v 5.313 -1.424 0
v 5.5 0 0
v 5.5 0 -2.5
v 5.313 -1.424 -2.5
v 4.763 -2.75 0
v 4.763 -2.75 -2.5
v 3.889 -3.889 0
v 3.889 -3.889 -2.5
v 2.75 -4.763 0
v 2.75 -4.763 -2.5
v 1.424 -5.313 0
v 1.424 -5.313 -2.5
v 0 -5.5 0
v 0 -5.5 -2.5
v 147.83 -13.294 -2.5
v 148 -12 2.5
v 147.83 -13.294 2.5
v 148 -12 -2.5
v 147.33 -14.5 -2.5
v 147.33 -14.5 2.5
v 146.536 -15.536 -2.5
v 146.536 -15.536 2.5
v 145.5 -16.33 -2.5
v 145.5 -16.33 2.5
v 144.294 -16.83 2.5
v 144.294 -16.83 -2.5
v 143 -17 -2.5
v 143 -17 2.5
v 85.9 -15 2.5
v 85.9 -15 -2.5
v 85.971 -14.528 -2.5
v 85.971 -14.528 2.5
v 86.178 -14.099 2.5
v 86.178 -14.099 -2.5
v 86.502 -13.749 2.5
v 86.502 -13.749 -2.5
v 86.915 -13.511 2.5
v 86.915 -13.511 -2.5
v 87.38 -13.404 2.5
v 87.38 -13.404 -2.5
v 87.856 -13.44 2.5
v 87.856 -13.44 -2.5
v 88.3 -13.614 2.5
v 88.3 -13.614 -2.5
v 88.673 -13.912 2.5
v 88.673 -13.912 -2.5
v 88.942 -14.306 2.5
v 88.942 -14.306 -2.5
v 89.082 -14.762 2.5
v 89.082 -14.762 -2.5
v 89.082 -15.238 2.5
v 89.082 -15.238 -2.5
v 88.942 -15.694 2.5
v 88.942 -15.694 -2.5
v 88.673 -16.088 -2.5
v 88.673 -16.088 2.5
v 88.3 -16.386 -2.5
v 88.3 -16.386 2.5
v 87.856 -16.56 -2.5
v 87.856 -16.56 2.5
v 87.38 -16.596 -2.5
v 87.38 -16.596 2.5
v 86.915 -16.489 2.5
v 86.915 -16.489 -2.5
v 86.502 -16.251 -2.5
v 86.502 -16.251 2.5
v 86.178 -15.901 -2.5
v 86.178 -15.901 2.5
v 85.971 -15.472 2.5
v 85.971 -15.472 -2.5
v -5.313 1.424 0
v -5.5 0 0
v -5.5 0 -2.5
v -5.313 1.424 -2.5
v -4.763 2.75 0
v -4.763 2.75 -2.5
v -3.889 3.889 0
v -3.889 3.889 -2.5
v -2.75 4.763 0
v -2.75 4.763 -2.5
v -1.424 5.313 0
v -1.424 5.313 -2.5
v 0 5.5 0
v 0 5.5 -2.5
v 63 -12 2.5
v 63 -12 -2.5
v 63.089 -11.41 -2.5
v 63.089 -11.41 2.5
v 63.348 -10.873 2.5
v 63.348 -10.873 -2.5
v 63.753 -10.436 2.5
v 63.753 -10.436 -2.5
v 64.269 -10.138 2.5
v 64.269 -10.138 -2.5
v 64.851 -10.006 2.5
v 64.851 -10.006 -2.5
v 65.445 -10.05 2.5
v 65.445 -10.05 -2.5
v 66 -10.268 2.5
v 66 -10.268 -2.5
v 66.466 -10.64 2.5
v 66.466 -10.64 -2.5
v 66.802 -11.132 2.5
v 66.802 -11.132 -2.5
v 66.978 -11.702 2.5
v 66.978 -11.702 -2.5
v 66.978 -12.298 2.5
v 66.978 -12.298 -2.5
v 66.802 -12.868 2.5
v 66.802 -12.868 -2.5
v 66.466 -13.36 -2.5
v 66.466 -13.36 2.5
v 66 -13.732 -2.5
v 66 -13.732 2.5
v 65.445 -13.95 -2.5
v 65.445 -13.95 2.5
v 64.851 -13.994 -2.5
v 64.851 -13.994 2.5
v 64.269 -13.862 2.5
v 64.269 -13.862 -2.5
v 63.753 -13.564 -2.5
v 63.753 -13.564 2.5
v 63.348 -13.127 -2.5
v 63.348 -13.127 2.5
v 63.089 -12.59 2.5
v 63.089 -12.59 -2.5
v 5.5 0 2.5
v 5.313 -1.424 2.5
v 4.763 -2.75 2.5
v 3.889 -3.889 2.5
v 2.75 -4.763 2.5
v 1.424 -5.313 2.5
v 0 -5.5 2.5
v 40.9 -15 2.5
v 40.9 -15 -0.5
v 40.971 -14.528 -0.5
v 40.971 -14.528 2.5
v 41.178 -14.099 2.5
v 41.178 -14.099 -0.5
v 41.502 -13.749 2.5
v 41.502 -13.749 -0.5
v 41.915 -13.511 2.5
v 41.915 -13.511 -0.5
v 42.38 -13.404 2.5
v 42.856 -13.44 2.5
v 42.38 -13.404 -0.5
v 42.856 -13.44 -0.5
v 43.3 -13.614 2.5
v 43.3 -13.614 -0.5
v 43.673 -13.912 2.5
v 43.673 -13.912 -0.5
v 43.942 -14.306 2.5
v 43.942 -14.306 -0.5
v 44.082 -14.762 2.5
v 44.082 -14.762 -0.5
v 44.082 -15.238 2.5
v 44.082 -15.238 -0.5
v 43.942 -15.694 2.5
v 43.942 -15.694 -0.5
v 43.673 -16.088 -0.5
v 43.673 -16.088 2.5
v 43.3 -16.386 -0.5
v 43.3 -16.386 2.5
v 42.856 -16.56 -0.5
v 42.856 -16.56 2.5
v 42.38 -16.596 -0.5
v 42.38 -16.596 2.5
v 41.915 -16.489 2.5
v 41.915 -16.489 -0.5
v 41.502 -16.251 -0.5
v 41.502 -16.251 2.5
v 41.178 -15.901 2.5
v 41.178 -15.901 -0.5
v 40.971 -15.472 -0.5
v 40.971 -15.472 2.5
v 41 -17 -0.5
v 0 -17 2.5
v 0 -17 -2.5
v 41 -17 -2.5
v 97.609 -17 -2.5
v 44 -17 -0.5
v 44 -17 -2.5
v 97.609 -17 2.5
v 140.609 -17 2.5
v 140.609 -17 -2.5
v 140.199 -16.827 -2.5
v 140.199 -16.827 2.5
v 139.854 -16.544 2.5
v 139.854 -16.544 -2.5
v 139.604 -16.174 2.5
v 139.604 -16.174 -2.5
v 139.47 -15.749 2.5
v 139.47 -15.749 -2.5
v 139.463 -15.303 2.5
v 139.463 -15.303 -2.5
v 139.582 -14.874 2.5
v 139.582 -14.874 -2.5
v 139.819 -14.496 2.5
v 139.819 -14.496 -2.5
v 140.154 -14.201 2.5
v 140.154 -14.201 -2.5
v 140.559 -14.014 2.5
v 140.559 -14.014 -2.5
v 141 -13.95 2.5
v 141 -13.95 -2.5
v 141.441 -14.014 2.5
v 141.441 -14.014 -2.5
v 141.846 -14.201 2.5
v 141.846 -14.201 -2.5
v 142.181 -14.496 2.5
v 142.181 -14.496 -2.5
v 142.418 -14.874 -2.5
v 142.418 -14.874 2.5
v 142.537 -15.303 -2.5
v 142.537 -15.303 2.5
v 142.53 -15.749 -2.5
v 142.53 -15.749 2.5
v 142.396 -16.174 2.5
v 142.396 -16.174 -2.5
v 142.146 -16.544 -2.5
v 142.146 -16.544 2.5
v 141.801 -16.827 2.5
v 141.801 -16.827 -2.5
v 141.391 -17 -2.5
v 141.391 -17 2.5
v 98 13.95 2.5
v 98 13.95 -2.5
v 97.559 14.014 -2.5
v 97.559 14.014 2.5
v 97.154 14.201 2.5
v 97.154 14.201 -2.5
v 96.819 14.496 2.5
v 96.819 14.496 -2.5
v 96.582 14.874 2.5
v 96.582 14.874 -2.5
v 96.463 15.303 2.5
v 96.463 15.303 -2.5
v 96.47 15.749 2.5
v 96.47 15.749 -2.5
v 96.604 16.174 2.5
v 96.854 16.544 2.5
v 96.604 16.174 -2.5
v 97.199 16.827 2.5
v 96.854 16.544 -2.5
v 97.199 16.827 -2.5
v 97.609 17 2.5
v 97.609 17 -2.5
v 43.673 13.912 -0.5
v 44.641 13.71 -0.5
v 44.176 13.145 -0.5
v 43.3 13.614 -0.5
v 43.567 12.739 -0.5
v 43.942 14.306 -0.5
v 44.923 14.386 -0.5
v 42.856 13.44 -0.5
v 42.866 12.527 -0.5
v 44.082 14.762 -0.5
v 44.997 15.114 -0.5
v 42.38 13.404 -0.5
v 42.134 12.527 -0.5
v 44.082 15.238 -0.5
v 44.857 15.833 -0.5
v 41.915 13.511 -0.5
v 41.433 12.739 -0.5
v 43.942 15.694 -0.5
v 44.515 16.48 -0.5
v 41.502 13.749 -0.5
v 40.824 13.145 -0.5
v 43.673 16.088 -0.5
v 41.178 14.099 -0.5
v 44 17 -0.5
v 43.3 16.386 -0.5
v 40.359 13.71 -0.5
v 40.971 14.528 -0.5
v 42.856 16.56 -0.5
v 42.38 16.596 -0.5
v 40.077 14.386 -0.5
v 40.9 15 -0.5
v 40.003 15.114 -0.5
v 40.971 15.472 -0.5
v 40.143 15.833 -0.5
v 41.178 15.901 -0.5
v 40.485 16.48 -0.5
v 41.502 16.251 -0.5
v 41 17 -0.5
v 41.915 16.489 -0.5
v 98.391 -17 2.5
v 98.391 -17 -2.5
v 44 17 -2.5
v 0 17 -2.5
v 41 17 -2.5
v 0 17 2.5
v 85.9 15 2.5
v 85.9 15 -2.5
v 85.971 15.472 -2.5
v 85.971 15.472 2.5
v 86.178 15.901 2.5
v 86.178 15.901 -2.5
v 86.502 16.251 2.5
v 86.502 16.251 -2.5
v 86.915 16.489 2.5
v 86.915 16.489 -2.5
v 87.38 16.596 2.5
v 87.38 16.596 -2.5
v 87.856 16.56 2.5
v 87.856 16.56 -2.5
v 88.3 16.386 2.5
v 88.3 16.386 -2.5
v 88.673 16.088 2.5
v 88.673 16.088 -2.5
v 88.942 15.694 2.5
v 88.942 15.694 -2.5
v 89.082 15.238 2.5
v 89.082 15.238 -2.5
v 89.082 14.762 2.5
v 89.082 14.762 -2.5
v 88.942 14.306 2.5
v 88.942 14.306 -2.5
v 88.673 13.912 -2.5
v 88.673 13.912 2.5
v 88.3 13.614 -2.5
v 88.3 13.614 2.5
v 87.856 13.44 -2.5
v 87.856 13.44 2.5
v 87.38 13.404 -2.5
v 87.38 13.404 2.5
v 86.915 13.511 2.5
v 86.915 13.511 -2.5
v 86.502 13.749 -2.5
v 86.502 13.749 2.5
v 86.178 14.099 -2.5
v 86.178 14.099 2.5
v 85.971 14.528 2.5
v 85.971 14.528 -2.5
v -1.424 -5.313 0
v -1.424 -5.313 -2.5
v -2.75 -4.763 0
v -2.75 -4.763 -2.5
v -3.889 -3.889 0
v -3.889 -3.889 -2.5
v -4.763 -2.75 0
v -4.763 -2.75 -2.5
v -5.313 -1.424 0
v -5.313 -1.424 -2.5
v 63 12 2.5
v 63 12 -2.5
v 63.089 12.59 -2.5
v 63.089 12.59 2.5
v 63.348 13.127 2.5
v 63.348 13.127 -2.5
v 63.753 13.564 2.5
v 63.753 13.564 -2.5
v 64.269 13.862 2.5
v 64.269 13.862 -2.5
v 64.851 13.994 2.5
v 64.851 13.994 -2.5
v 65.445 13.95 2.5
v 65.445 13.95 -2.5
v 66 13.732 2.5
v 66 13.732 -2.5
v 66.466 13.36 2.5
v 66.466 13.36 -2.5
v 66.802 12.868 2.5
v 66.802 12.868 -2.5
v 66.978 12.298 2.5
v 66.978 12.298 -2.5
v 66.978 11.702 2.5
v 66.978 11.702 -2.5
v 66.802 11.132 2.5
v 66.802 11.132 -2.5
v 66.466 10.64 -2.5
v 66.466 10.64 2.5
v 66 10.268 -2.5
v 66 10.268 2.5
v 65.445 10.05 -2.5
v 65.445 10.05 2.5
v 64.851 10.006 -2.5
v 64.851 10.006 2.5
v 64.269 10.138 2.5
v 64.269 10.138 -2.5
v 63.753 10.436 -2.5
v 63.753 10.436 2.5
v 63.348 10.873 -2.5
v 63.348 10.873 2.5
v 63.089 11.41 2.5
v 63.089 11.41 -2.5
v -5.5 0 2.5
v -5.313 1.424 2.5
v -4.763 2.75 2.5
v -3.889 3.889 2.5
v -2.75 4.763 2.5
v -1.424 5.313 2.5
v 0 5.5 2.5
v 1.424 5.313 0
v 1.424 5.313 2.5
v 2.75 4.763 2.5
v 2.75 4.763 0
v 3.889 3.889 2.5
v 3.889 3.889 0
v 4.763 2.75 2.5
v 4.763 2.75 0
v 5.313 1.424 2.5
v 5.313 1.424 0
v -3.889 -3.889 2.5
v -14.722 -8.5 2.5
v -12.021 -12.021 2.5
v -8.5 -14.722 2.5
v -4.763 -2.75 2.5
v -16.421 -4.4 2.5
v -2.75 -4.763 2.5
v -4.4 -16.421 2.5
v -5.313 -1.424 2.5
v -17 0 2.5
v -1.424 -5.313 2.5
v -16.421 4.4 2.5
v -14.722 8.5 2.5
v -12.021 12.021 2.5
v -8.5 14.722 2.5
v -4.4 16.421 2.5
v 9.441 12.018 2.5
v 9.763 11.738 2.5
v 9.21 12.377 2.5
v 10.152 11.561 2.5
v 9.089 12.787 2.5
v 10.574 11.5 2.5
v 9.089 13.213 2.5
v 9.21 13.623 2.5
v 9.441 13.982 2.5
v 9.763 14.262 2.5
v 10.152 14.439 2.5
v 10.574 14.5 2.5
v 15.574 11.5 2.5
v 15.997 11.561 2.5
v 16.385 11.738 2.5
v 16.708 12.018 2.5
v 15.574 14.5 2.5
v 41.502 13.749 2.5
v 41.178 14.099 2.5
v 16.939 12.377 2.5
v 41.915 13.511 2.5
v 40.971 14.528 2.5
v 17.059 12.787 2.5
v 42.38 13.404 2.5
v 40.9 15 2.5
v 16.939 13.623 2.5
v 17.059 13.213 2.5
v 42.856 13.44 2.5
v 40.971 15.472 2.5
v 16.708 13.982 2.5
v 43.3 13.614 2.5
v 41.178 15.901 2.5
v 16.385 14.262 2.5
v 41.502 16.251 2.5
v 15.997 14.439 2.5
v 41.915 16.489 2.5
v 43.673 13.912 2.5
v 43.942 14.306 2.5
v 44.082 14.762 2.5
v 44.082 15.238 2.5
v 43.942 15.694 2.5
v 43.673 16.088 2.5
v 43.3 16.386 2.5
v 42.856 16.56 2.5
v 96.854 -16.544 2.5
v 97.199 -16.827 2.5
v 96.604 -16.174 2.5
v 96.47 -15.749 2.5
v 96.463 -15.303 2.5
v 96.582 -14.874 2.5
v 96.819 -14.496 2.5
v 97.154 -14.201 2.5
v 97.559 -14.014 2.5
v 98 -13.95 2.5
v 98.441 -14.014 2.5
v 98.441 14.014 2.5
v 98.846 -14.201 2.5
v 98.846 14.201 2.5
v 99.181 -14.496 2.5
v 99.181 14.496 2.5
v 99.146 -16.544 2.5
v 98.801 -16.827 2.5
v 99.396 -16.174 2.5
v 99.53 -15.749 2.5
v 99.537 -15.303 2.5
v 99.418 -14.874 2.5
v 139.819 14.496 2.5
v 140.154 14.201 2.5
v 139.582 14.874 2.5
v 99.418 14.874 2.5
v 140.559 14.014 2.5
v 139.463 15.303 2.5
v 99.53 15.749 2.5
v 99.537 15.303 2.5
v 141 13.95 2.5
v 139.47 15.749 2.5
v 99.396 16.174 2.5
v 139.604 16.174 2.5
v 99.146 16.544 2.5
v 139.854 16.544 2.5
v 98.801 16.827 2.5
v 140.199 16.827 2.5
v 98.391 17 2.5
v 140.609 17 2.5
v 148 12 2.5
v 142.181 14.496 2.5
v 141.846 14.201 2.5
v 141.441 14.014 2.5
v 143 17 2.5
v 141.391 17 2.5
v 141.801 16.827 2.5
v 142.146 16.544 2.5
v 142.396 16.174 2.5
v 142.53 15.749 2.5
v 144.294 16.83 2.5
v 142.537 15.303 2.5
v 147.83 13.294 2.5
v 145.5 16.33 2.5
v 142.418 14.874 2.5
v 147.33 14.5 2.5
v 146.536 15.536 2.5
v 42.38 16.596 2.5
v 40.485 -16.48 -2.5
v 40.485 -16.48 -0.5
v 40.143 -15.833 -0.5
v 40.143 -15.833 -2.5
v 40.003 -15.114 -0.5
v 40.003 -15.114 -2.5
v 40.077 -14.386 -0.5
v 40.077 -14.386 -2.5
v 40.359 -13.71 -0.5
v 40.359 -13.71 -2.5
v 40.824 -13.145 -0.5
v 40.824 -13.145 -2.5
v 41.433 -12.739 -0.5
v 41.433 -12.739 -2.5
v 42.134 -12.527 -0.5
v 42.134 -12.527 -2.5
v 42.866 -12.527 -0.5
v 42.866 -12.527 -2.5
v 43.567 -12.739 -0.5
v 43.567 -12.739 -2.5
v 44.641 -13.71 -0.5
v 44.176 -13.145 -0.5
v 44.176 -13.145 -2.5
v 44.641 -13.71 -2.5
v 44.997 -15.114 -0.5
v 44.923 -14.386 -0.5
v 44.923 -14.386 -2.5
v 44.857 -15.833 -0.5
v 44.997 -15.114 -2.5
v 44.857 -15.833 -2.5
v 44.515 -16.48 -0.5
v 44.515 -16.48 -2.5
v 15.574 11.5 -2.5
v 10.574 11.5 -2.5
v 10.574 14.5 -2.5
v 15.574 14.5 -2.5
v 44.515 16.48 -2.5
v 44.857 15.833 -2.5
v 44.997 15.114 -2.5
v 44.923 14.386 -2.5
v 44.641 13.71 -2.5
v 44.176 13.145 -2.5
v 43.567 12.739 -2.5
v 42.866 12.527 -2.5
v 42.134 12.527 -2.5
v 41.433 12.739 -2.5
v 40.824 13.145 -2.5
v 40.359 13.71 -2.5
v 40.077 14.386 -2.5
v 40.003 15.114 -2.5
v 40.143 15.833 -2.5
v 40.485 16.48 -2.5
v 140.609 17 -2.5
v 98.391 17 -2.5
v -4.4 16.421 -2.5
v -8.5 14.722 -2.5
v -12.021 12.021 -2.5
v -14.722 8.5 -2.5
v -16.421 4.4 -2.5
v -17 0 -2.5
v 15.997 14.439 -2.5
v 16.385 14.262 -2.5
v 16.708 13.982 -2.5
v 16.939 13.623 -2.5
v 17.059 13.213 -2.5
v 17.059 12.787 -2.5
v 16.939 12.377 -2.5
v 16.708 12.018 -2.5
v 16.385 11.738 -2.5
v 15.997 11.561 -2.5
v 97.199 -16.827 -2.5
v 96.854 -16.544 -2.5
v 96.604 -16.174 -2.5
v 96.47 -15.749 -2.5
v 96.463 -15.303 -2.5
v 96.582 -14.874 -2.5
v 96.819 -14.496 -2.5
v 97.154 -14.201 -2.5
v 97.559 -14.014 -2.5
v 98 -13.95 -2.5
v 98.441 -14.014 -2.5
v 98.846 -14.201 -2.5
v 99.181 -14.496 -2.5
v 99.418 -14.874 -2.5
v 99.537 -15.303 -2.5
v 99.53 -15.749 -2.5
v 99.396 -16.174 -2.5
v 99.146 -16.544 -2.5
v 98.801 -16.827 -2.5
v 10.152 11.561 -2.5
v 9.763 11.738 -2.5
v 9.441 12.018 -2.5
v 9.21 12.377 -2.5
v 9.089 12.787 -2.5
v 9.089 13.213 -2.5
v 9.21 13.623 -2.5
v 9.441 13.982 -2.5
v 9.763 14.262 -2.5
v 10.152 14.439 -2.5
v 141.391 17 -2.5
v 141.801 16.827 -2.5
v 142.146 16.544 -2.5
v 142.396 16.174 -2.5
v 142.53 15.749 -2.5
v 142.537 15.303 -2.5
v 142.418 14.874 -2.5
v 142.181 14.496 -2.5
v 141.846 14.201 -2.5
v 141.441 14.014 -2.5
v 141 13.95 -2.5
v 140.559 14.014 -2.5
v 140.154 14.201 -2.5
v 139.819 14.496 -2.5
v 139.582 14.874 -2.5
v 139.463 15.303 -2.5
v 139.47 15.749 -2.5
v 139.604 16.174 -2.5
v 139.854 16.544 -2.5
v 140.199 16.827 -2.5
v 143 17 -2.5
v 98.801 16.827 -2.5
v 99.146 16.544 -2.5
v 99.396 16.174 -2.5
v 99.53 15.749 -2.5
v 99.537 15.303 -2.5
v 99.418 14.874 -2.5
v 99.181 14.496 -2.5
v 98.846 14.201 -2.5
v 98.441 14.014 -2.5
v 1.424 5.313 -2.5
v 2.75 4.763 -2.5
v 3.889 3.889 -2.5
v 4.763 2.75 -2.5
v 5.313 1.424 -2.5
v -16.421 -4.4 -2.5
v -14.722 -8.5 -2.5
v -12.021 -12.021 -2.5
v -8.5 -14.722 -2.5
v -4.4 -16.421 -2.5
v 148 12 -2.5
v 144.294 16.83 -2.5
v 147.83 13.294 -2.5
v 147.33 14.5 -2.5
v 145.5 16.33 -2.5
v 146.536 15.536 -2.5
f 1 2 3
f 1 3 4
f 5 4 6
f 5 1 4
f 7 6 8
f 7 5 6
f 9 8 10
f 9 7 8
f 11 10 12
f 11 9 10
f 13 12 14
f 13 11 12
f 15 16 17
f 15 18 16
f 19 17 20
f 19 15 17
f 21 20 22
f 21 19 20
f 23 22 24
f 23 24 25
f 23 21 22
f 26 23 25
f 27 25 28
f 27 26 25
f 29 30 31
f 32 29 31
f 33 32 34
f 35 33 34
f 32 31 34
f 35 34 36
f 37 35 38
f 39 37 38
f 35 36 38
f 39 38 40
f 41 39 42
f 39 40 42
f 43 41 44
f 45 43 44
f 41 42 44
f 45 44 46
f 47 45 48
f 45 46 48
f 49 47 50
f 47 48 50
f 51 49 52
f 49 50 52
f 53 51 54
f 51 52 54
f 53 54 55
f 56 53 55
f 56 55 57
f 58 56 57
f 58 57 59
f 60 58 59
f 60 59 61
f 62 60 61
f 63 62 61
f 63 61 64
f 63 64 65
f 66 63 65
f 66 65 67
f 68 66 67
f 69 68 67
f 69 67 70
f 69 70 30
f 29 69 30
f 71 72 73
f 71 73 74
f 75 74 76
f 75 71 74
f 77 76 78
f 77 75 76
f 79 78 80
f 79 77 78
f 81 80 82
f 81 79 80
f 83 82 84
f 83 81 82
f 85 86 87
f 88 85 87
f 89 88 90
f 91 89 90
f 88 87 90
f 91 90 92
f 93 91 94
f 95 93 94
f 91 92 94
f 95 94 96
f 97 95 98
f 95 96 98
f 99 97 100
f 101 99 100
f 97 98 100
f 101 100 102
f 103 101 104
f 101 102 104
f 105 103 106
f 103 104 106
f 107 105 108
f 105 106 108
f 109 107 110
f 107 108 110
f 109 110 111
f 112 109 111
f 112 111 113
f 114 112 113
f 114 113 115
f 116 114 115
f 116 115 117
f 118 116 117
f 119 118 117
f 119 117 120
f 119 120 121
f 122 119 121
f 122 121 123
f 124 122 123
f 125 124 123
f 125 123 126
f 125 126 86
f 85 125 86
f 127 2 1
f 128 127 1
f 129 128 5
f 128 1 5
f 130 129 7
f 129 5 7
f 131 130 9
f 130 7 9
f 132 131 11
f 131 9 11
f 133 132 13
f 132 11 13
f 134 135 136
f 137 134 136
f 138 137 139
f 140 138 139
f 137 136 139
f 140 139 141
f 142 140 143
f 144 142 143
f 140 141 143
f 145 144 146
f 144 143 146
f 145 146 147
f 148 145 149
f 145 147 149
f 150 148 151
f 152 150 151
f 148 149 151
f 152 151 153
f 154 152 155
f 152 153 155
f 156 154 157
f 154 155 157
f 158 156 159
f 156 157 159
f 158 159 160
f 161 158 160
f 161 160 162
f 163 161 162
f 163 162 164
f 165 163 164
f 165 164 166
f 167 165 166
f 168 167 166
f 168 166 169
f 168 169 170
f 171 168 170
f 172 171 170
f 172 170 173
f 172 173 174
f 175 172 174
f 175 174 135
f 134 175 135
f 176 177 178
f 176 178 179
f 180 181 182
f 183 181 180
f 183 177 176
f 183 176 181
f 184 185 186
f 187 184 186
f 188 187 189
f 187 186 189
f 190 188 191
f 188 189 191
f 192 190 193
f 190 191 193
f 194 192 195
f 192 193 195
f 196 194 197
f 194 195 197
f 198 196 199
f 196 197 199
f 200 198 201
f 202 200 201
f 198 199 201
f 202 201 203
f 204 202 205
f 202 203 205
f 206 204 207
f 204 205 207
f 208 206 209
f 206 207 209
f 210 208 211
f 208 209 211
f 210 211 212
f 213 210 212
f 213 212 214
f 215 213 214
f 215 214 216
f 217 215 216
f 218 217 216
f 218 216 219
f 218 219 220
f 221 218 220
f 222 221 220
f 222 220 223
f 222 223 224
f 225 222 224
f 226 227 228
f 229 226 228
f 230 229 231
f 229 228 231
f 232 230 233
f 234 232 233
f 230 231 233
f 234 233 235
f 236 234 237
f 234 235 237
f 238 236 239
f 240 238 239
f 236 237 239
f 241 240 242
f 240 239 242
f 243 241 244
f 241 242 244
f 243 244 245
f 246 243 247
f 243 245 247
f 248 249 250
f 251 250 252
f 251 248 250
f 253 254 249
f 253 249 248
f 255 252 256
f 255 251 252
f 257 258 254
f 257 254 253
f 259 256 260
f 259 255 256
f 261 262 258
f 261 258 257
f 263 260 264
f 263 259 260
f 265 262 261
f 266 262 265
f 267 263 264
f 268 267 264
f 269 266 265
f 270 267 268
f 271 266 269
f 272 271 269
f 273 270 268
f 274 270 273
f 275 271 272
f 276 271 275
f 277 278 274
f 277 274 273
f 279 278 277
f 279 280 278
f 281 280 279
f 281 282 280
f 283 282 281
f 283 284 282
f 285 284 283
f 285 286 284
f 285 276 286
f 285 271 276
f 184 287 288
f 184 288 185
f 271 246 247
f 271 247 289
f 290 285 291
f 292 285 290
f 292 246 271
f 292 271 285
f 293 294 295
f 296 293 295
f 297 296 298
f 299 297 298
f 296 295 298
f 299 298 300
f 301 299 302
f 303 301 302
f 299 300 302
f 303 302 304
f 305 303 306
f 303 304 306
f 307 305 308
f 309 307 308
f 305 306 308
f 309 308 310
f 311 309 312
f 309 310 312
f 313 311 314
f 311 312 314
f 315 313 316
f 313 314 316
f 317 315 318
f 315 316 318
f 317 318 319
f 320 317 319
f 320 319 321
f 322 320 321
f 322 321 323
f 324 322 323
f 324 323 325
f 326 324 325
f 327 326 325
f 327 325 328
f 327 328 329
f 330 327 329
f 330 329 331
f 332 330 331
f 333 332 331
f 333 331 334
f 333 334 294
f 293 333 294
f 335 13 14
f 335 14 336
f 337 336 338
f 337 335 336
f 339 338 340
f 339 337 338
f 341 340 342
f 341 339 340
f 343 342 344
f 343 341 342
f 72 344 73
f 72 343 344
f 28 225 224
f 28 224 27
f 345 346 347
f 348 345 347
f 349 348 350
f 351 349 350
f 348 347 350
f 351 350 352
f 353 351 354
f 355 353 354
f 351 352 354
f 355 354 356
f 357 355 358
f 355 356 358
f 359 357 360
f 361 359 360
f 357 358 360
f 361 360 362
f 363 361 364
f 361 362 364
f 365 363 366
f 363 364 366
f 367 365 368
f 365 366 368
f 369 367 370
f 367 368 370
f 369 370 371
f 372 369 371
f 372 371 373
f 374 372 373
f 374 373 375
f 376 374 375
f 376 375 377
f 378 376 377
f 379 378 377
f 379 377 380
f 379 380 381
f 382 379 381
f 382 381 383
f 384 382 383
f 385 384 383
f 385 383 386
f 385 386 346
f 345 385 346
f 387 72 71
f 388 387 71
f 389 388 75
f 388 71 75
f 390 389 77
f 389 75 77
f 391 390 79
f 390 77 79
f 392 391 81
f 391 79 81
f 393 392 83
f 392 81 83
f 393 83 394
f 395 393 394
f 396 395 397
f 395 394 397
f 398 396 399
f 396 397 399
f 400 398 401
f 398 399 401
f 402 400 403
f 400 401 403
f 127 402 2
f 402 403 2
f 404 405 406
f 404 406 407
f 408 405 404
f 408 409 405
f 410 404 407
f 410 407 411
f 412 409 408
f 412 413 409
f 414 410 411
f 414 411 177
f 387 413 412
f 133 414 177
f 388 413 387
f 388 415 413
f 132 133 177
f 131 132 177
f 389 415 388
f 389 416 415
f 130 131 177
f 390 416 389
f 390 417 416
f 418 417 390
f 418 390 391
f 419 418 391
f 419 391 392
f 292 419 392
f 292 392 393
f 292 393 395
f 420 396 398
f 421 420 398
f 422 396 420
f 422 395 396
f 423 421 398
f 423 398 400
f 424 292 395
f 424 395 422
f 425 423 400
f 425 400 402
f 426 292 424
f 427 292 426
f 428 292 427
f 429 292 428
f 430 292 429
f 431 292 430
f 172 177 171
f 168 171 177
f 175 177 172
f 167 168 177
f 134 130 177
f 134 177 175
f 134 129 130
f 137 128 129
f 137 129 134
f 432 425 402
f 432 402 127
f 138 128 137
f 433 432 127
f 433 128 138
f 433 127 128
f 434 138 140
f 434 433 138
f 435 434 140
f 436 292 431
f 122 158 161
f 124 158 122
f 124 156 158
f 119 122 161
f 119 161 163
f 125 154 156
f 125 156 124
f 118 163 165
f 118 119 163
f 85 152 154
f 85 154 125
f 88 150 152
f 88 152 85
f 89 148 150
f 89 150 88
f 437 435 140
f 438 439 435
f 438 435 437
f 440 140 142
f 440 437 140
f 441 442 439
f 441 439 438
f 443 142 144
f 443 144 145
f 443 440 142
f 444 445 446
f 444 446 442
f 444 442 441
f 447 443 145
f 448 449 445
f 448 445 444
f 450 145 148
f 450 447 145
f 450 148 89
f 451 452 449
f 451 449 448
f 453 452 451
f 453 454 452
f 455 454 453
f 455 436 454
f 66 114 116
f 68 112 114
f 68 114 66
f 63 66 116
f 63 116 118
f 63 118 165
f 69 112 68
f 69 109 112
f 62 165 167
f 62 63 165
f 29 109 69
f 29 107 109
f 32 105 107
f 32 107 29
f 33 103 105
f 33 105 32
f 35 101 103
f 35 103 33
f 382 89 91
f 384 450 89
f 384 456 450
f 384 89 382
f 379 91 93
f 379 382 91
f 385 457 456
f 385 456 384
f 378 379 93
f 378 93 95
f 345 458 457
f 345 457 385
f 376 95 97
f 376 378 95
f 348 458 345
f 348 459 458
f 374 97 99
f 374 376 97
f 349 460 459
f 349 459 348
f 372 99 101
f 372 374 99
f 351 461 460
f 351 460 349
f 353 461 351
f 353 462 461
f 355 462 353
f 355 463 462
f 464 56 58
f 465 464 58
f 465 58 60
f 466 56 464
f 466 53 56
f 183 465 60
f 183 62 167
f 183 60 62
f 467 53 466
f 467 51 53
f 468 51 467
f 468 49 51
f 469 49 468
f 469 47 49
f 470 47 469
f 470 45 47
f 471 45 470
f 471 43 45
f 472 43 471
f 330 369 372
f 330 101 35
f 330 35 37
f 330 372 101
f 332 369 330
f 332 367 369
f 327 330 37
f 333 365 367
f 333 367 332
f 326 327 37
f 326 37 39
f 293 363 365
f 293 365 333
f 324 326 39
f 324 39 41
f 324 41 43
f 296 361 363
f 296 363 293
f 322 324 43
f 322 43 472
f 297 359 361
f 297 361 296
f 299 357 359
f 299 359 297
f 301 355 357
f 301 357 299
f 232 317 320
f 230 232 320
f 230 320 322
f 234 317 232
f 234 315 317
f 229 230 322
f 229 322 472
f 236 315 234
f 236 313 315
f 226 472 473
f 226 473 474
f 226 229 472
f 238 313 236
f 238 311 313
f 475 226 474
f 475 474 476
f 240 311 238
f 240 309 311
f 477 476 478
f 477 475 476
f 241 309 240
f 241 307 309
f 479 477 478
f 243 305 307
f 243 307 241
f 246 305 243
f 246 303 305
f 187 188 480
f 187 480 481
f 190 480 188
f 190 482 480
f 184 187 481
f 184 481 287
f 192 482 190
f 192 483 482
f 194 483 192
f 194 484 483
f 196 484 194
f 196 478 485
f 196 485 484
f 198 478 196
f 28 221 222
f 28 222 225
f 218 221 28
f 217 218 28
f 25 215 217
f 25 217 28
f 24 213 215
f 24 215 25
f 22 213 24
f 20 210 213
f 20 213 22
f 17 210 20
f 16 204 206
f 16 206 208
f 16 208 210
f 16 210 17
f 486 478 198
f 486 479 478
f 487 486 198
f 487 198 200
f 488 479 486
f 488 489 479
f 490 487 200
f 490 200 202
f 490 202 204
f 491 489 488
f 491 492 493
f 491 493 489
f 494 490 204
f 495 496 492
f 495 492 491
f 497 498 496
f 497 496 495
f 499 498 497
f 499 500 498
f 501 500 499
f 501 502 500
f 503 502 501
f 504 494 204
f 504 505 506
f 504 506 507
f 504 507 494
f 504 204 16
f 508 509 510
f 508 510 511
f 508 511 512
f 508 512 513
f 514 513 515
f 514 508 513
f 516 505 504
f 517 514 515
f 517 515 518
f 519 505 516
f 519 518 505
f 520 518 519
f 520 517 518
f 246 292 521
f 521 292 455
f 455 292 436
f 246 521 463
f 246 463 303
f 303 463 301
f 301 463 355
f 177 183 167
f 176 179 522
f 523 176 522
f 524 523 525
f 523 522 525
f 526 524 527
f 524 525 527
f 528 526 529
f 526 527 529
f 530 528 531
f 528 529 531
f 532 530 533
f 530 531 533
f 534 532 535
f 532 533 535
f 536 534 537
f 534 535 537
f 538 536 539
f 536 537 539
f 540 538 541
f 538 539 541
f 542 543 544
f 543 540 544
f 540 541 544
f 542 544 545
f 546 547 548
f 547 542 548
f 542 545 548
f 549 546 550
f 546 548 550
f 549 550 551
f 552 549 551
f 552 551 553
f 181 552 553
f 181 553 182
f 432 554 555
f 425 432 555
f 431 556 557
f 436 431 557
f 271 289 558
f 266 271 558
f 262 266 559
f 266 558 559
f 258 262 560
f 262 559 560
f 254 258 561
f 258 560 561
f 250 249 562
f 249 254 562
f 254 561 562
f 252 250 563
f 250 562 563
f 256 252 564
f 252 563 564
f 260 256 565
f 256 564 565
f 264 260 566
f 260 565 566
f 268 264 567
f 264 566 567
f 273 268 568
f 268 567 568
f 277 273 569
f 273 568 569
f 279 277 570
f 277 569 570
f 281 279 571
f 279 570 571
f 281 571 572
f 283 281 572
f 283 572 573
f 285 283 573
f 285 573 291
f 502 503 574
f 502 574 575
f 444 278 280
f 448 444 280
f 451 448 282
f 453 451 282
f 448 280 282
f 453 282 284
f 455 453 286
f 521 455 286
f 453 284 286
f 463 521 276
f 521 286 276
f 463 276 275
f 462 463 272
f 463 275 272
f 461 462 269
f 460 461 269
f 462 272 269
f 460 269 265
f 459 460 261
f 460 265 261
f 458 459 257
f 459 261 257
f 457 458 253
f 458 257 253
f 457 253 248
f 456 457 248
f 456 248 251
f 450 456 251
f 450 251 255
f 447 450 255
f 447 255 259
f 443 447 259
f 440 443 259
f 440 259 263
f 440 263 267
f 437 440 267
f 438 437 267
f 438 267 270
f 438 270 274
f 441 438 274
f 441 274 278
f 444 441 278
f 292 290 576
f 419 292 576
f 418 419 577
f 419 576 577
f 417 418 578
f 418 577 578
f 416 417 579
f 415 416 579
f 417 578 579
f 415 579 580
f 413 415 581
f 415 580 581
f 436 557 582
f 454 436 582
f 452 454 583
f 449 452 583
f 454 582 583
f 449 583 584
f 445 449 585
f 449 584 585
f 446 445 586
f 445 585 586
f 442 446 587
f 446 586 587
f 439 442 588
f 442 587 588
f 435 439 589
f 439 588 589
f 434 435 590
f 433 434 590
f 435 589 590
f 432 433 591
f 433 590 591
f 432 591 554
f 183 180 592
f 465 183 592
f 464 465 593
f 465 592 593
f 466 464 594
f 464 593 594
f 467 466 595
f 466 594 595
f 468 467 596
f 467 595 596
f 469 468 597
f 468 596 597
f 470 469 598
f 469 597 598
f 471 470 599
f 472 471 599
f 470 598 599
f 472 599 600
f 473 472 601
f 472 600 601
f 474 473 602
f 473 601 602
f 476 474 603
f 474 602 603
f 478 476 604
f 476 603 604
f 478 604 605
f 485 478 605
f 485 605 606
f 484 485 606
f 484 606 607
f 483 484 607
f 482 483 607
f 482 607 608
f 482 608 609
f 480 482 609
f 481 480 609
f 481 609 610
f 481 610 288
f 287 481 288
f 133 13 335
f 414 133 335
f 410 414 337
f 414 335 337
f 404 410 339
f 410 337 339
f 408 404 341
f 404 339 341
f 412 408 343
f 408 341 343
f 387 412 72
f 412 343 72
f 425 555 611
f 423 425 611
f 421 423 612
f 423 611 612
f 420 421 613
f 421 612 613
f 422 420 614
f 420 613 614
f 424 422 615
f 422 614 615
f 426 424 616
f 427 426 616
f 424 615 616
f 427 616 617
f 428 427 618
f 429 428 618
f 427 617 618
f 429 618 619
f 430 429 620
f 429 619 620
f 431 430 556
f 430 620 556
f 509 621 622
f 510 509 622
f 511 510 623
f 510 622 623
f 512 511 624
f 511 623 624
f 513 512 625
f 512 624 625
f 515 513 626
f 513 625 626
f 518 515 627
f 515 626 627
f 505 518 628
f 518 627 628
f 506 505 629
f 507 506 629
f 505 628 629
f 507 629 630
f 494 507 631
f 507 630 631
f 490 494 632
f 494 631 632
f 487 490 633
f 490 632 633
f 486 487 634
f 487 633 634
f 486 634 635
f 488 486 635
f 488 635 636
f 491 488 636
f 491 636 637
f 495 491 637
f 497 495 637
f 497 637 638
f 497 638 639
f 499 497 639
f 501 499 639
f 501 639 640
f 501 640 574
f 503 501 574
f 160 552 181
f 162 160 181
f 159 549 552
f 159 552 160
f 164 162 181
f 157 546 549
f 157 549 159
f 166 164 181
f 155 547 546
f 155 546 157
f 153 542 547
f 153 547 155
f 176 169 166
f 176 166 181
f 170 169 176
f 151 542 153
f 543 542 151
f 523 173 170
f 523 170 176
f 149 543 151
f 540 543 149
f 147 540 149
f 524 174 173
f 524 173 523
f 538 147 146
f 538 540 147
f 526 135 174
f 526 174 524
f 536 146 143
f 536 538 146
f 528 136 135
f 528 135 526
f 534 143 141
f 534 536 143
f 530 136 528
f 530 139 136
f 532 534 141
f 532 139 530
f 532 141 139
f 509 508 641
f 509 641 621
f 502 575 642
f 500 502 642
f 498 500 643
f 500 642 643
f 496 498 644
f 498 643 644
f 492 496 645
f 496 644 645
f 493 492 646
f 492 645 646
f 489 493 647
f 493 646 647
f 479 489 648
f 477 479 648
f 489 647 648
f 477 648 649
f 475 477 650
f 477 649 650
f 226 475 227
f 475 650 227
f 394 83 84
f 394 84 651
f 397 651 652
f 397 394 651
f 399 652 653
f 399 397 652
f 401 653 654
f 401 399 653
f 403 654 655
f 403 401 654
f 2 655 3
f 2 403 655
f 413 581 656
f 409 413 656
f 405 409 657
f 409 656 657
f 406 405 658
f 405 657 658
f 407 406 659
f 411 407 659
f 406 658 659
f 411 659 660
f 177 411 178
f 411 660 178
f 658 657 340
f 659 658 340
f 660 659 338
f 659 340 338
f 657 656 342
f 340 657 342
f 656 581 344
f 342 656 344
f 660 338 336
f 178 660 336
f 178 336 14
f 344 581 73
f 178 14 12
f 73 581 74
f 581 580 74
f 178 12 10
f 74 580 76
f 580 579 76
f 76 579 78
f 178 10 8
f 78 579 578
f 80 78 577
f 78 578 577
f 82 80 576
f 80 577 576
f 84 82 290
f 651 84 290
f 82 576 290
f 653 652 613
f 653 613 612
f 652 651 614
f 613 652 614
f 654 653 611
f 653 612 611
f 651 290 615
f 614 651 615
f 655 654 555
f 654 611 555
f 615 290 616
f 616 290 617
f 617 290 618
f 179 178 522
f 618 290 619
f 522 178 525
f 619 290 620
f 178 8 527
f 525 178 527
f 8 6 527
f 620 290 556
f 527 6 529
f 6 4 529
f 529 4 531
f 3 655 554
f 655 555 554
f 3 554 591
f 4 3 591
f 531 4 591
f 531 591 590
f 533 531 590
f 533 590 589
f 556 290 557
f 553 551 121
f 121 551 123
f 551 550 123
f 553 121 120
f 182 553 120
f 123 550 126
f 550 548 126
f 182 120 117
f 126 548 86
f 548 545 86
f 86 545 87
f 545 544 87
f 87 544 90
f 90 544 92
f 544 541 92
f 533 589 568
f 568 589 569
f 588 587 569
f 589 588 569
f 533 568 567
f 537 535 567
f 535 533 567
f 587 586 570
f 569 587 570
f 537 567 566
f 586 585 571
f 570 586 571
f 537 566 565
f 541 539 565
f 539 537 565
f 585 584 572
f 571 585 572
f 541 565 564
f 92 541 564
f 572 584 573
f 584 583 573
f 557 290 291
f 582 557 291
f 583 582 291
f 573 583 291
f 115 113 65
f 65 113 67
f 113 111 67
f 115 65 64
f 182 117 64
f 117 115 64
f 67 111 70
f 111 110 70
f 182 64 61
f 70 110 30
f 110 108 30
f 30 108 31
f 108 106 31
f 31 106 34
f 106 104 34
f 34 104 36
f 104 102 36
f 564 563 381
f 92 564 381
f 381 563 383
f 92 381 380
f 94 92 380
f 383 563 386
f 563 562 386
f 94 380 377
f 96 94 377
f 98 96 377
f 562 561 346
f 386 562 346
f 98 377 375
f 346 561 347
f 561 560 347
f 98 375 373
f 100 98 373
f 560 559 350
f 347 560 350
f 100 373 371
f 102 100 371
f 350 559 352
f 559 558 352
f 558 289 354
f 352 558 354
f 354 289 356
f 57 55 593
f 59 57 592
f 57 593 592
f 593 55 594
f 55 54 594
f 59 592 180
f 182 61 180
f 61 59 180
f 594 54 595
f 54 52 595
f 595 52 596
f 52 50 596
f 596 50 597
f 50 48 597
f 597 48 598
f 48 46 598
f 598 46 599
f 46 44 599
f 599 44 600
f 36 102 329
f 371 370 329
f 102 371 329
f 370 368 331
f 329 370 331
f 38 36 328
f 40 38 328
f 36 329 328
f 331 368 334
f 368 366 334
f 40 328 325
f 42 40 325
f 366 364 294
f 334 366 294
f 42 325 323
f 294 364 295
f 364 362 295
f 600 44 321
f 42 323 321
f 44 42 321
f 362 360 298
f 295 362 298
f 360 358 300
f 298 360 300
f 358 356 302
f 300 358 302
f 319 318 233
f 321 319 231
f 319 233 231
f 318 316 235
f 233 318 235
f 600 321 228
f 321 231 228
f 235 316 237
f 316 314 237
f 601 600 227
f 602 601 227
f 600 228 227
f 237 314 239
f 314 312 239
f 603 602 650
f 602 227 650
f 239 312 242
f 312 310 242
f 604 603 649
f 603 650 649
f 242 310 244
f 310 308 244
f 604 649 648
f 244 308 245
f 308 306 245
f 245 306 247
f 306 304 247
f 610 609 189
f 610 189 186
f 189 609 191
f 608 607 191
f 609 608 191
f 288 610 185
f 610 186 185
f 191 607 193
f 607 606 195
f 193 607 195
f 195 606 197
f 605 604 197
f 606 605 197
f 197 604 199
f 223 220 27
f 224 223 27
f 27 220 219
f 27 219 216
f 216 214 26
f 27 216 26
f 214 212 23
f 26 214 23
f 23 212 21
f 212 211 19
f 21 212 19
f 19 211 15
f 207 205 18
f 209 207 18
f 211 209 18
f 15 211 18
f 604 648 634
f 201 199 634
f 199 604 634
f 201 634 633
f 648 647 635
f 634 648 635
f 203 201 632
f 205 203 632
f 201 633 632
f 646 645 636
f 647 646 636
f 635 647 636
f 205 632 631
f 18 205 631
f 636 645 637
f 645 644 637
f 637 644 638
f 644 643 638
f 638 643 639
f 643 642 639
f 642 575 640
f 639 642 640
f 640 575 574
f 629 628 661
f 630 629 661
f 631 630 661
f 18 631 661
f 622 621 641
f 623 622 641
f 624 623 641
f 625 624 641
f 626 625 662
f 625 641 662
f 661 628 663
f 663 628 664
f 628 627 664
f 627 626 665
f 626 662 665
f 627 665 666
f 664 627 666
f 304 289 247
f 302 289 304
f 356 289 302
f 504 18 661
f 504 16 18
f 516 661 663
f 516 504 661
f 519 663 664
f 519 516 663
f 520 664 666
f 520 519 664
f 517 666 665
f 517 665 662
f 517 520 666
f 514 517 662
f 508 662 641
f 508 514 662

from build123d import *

# Parameters (mm, degrees)
SKETCH2_R           = 5.5
BOSS_EXTRUDE1_DEPTH = 2.5
FILLET1_R           = 5
SKETCH3_R           = 1.6
SKETCH3_R_2         = 2
CUT_EXTRUDE1_DEPTH  = 150.057036063
SKETCH3_4_R         = 1.6
SKETCH3_4_R_2       = 2
CUT_EXTRUDE2_DEPTH  = 10
SKETCH4_R           = 2.5
CUT_EXTRUDE3_DEPTH  = 2


with BuildPart() as part:
    # Sketch2 → Boss-Extrude1 (new, symmetric)
    with BuildSketch(Plane.XY):
        with BuildLine():
            Line((148, 17), (0, 17))
            ThreePointArc((0, 17), (-17, 0), (0, -17))
            Line((0, -17), (148, -17))
            Line((148, -17), (148, 17))
        make_face()
        Circle(SKETCH2_R, mode=Mode.SUBTRACT)
    extrude(amount=BOSS_EXTRUDE1_DEPTH, both=True)

    # Fillet1
    fillet1_edges = [part.edges().sort_by_distance(p)[0] for p in [
        (148, -17, 0),
        (148, 17, 0),
    ]]
    fillet(fillet1_edges, radius=FILLET1_R)

    # Sketch3 → Cut-Extrude1 (cut, through all)
    with BuildSketch(Plane(origin=(0, 0, -2.5), x_dir=(-1, 0, 0), z_dir=(0, 0, -1))):
        with BuildLine():
            Line((-97.609487516, 17), (-98.390512484, 17))
            ThreePointArc((-98.390512484, 17), (-99.537449186, 15.303149803), (-98, 13.95))
            ThreePointArc((-98, 13.95), (-96.462550814, 15.303149803), (-97.609487516, 17))
        make_face()
        with BuildLine():
            ThreePointArc((-141.390512484, 17), (-141, 13.95), (-140.609487516, 17))
            Line((-140.609487516, 17), (-141.390512484, 17))
        make_face()
        with Locations((-87.5, 15)):
            Circle(SKETCH3_R)
        with Locations((-65, 12)):
            Circle(SKETCH3_R_2)
        with BuildLine():
            Line((-141.390512484, -17), (-140.609487516, -17))
            ThreePointArc((-140.609487516, -17), (-141, -13.95), (-141.390512484, -17))
        make_face()
        with BuildLine():
            ThreePointArc((-97.609487516, -17), (-98, -13.95), (-98.390512484, -17))
            Line((-98.390512484, -17), (-97.609487516, -17))
        make_face()
        with BuildLine():
            Line((-10.574175964, 14.5), (-15.574175964, 14.5))
            ThreePointArc((-15.574175964, 14.5), (-17.074175964, 13), (-15.574175964, 11.5))
            Line((-15.574175964, 11.5), (-10.574175964, 11.5))
            ThreePointArc((-10.574175964, 11.5), (-9.074175964, 13), (-10.574175964, 14.5))
        make_face()
        with Locations((-87.5, -15)):
            Circle(SKETCH3_R)
        with Locations((-65, -12)):
            Circle(SKETCH3_R_2)
    extrude(amount=-CUT_EXTRUDE1_DEPTH, mode=Mode.SUBTRACT)

    # Sketch3<4> → Cut-Extrude2 (cut)
    with BuildSketch(Plane(origin=(0, 0, -2.5), x_dir=(-1, 0, 0), z_dir=(0, 0, -1))):
        with BuildLine():
            Line((-97.609487516, 17), (-98.390512484, 17))
            ThreePointArc((-98.390512484, 17), (-99.537449186, 15.303149803), (-98, 13.95))
            ThreePointArc((-98, 13.95), (-96.462550814, 15.303149803), (-97.609487516, 17))
        make_face()
        with BuildLine():
            ThreePointArc((-141.390512484, 17), (-141, 13.95), (-140.609487516, 17))
            Line((-140.609487516, 17), (-141.390512484, 17))
        make_face()
        with Locations((-87.5, 15)):
            Circle(SKETCH3_4_R)
        with Locations((-65, 12)):
            Circle(SKETCH3_4_R_2)
        with BuildLine():
            Line((-141.390512484, -17), (-140.609487516, -17))
            ThreePointArc((-140.609487516, -17), (-141, -13.95), (-141.390512484, -17))
        make_face()
        with BuildLine():
            ThreePointArc((-97.609487516, -17), (-98, -13.95), (-98.390512484, -17))
            Line((-98.390512484, -17), (-97.609487516, -17))
        make_face()
        with BuildLine():
            Line((-10.574175964, 14.5), (-15.574175964, 14.5))
            ThreePointArc((-15.574175964, 14.5), (-17.074175964, 13), (-15.574175964, 11.5))
            Line((-15.574175964, 11.5), (-10.574175964, 11.5))
            ThreePointArc((-10.574175964, 11.5), (-9.074175964, 13), (-10.574175964, 14.5))
        make_face()
        with Locations((-87.5, -15)):
            Circle(SKETCH3_4_R)
        with Locations((-42.5, -15)):
            Circle(SKETCH3_4_R)
        with Locations((-42.5, 15)):
            Circle(SKETCH3_4_R)
        with Locations((-65, -12)):
            Circle(SKETCH3_4_R_2)
    extrude(amount=-CUT_EXTRUDE2_DEPTH, mode=Mode.SUBTRACT)

    # Sketch4 → Cut-Extrude3 (cut)
    with BuildSketch(Plane(origin=(0, 0, -2.5), x_dir=(-1, 0, 0), z_dir=(0, 0, -1))):
        with Locations((-42.5, 15)):
            Circle(SKETCH4_R)
        with Locations((-42.5, -15)):
            Circle(SKETCH4_R)
    extrude(amount=-CUT_EXTRUDE3_DEPTH, mode=Mode.SUBTRACT)


solid = part.part
